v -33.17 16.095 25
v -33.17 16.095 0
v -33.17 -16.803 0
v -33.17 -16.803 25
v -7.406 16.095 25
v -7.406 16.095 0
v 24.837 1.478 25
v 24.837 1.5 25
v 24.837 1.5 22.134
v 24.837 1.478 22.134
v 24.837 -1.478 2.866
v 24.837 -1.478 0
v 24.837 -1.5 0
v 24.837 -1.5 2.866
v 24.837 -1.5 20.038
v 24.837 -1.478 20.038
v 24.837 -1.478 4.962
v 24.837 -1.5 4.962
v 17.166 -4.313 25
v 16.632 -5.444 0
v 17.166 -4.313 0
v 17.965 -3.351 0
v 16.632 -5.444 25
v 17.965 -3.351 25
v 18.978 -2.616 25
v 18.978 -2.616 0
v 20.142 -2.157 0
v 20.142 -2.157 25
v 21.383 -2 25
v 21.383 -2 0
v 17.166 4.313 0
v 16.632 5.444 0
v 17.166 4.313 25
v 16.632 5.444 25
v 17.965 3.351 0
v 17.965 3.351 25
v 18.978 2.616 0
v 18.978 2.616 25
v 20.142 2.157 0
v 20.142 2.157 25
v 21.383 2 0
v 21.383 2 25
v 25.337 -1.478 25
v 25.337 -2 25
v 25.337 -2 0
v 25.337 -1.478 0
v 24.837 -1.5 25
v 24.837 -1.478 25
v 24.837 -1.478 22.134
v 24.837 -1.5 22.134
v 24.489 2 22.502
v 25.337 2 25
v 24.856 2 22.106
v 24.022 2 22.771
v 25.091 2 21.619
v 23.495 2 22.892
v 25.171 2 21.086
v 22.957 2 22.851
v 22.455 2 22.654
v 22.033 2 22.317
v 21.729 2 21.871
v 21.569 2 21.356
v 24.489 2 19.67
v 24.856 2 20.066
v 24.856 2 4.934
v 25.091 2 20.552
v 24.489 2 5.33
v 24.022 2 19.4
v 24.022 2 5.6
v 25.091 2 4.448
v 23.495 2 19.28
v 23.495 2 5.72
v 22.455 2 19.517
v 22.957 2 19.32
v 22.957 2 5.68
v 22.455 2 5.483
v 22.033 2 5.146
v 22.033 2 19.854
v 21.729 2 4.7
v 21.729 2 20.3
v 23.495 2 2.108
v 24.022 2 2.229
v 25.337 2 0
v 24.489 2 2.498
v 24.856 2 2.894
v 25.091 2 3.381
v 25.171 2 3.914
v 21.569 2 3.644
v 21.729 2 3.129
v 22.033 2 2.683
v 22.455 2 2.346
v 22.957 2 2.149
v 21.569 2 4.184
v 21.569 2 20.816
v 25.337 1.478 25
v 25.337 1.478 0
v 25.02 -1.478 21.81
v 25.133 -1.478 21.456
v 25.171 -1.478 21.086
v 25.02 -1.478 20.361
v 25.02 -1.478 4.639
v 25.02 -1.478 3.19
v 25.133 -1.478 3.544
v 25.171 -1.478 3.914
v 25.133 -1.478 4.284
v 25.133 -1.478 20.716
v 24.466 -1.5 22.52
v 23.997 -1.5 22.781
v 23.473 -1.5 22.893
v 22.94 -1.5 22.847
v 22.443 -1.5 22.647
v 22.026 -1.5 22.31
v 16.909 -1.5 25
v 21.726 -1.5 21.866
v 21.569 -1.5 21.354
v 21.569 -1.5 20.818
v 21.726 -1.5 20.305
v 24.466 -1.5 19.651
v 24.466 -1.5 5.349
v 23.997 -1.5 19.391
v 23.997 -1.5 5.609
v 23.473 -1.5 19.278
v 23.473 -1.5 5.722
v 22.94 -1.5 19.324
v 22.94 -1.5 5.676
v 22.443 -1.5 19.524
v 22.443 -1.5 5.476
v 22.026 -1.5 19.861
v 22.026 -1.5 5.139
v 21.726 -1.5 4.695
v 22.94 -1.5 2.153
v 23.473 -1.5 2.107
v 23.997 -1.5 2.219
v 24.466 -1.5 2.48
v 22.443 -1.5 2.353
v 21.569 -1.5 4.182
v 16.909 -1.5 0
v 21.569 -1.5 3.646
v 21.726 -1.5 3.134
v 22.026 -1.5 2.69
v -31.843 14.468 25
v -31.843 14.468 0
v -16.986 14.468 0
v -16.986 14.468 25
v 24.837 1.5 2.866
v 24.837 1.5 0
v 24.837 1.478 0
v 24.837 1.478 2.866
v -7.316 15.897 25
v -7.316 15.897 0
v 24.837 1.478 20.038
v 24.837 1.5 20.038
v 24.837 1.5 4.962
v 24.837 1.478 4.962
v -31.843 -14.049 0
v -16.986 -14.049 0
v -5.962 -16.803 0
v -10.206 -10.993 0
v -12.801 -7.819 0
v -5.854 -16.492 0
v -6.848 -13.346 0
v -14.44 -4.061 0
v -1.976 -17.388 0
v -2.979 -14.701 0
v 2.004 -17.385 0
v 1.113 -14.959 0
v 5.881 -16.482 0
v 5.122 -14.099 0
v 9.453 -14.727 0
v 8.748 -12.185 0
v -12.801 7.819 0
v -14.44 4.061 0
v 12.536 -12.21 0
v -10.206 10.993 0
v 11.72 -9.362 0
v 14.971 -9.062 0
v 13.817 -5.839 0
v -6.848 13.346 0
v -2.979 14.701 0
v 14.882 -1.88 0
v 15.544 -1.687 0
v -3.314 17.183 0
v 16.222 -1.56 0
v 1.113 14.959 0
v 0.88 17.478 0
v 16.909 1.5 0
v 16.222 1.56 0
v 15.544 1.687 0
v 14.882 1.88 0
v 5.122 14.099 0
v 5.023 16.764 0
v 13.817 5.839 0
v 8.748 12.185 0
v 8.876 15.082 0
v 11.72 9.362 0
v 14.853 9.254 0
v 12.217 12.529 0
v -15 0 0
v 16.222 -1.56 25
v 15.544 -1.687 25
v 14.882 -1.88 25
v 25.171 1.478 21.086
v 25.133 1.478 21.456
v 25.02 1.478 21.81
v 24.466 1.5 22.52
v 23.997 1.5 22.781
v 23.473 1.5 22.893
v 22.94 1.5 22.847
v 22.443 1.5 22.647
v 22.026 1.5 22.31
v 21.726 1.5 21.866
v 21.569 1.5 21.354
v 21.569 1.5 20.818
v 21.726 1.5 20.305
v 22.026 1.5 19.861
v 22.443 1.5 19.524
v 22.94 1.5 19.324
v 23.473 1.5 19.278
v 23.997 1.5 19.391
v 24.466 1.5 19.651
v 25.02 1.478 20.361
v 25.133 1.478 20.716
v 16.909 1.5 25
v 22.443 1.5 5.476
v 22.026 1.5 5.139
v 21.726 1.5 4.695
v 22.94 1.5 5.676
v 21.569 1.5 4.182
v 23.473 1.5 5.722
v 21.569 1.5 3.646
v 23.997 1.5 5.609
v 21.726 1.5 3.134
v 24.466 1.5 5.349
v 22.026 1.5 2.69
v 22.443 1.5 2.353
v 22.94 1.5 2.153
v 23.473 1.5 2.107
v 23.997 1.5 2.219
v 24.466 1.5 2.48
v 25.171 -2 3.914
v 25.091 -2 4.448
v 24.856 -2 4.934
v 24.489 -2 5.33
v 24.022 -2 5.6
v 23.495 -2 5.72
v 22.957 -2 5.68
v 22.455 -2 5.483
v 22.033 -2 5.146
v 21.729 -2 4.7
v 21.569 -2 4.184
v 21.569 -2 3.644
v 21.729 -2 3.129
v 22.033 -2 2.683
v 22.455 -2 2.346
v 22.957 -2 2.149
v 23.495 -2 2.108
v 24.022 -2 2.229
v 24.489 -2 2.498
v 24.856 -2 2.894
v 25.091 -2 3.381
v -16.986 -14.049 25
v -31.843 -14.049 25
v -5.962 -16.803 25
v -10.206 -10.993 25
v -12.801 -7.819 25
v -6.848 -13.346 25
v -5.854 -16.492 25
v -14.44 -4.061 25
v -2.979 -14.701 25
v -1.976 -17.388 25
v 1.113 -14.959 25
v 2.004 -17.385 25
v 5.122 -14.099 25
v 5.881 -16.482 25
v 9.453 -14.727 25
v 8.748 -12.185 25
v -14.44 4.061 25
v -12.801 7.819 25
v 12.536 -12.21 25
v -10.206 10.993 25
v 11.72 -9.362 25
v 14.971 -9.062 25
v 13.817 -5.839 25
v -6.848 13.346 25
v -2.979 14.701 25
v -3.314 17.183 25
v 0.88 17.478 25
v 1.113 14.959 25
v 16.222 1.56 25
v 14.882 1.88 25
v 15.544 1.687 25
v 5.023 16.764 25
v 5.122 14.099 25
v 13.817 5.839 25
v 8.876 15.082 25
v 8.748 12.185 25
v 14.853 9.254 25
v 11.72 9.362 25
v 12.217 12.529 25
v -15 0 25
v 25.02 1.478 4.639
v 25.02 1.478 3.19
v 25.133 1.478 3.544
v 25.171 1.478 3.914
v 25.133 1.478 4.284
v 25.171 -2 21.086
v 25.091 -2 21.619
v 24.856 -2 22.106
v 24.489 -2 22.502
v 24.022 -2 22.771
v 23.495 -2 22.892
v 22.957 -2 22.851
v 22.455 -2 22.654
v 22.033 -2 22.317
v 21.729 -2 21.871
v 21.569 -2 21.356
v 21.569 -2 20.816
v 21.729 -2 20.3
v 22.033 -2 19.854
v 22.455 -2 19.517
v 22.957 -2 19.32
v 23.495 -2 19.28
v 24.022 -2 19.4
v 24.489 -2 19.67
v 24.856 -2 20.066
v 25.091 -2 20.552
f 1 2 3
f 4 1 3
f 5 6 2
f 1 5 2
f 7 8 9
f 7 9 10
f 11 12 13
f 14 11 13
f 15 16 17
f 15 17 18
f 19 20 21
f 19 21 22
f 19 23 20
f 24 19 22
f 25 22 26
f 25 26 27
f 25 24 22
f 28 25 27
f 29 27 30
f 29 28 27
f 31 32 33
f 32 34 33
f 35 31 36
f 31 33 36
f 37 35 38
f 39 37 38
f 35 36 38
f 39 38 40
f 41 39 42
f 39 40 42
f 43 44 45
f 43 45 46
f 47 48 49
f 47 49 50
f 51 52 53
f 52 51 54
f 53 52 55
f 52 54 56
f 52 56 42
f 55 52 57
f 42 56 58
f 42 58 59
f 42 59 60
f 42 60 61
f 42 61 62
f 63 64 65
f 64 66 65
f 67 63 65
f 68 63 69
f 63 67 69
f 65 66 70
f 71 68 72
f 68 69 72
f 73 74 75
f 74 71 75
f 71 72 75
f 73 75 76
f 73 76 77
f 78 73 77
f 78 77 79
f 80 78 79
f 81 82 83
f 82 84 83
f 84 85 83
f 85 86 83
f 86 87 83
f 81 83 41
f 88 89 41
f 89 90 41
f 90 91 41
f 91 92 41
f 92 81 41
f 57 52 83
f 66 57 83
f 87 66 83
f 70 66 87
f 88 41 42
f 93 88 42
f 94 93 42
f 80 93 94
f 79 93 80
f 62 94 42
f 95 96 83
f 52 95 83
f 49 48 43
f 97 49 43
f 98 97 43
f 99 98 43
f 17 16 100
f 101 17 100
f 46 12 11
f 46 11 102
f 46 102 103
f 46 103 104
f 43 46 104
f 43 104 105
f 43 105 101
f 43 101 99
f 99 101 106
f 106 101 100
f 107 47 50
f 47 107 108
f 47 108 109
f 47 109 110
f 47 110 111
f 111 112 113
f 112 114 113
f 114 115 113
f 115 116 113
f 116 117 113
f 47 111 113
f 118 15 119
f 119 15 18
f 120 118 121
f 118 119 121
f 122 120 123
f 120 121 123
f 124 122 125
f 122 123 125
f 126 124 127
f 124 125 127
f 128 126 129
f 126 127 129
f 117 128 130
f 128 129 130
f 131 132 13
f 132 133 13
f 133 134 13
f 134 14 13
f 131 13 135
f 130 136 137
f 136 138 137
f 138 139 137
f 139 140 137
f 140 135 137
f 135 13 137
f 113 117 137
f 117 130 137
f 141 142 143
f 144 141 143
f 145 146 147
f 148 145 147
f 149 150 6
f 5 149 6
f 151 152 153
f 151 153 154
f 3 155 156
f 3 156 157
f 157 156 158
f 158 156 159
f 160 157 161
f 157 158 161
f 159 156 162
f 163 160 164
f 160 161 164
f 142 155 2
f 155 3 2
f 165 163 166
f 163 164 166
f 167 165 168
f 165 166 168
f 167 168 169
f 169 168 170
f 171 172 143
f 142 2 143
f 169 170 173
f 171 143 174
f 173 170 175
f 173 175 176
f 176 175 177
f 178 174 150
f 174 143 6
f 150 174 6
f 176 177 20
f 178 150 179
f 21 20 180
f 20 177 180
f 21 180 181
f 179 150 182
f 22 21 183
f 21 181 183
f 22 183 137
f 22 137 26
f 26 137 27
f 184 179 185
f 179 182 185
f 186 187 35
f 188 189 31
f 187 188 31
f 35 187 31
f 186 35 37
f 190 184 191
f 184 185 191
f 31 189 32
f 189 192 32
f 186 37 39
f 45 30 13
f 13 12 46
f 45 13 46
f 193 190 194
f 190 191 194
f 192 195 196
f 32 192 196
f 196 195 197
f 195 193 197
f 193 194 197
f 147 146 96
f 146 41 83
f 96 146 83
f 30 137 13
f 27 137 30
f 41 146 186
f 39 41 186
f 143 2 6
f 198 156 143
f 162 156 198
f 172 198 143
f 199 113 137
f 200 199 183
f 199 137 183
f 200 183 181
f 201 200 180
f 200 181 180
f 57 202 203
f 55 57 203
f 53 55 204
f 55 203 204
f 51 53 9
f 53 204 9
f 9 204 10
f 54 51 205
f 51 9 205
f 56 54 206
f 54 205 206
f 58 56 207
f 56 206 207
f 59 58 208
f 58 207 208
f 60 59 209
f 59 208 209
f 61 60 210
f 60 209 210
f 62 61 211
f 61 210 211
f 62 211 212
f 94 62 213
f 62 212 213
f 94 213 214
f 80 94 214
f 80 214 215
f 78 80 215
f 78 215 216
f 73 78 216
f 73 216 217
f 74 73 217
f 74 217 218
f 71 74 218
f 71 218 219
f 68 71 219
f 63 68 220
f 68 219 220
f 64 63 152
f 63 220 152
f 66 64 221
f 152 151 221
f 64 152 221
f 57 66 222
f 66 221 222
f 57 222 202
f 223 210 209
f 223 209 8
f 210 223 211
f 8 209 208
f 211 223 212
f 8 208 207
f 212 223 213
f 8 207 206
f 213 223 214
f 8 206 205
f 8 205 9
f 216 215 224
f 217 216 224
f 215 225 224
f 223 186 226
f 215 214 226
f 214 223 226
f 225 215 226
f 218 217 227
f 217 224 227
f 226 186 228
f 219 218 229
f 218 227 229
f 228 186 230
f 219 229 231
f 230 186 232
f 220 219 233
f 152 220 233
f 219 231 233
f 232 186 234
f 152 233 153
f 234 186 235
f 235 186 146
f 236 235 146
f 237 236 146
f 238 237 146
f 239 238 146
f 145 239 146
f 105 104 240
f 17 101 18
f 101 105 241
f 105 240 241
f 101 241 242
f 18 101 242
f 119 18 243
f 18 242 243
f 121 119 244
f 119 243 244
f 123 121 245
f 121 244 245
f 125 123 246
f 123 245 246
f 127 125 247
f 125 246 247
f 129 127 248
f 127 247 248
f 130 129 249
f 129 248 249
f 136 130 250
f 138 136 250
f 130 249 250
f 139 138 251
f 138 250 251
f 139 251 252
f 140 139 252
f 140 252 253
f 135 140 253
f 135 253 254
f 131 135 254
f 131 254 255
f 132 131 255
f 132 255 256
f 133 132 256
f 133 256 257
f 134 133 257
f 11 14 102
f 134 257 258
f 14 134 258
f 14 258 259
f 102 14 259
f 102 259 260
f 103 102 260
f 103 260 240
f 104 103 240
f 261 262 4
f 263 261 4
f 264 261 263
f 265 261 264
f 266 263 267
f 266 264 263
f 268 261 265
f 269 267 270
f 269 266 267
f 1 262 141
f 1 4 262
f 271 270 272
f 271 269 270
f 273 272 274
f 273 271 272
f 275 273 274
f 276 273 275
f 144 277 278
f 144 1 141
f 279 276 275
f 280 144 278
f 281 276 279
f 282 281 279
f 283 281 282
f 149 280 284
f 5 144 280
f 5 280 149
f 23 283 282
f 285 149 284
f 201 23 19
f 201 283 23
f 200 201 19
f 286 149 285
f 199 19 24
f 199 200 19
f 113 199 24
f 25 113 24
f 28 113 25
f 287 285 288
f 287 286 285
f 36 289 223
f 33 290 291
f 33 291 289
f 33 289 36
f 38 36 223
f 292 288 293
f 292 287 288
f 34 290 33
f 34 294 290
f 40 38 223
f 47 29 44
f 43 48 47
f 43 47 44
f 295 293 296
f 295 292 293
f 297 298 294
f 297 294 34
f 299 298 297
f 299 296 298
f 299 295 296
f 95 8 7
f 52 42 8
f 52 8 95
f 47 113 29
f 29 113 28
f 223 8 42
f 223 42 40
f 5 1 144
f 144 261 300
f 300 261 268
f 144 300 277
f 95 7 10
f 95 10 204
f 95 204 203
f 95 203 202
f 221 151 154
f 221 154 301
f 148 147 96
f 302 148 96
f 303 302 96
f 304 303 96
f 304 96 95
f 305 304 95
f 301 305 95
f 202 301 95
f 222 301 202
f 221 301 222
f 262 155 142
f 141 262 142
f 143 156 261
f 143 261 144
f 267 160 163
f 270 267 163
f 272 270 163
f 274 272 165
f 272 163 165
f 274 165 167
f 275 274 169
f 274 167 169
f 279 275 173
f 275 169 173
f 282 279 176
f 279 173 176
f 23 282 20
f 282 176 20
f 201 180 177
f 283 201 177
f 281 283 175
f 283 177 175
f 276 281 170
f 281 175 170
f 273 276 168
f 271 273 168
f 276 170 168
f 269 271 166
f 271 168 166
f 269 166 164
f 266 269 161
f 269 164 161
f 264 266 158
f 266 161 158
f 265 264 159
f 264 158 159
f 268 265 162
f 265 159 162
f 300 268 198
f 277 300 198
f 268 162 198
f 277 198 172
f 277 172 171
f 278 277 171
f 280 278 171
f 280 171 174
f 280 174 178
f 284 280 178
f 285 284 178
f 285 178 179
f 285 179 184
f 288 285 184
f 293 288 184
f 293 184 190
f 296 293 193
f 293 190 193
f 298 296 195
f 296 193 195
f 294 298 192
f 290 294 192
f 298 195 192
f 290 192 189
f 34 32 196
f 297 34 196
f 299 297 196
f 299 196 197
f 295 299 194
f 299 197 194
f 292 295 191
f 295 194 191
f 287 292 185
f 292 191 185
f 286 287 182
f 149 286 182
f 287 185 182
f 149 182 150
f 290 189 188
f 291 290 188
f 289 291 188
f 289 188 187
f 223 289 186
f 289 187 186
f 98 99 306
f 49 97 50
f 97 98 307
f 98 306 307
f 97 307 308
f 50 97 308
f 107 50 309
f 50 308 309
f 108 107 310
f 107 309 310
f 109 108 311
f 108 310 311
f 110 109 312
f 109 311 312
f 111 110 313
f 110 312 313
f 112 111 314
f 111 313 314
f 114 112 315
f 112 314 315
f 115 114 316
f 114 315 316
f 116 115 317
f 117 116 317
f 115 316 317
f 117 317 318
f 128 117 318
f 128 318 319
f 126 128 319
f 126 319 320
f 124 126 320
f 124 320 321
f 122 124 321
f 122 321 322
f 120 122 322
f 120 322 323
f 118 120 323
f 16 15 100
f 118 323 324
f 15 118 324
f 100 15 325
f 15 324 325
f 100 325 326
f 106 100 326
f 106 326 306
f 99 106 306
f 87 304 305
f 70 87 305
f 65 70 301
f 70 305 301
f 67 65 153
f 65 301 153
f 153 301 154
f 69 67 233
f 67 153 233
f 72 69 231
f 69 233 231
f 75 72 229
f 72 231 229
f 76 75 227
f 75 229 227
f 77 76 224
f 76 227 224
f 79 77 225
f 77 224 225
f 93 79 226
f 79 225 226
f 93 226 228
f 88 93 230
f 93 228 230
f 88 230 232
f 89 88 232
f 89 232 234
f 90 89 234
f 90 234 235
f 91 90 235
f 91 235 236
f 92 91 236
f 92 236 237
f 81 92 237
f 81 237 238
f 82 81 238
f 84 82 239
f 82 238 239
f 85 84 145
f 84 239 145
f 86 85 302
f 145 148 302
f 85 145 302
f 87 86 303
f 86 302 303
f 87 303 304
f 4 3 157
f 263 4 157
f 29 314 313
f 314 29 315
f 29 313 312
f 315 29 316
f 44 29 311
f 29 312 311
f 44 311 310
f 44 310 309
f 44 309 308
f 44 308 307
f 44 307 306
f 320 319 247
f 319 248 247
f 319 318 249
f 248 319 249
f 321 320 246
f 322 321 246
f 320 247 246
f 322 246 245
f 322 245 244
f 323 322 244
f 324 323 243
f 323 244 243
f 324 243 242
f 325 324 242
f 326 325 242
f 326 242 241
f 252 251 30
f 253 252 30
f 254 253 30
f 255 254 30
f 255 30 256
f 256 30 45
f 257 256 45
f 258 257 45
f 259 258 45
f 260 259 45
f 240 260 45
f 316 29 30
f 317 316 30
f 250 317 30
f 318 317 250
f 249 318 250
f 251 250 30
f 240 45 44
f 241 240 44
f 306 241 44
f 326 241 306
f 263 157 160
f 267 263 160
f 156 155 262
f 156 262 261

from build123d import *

# Parameters (mm, degrees)
F1_DEPTH       = 80
F2_R           = 9.4880271992
F3_DEPTH       = 600
F4_W           = 4.0547028184
F4_H           = 2.2076517344
F5_DEPTH       = 15
F6_R           = 8
F7_DEPTH       = 600
F9_START       = 50
F8_R           = 7.625
F9_DEPTH       = 570
F10_W          = 0.488139689
F10_H          = 8.393028751
F11_DEPTH      = 15
F13_DEPTH      = 25
F15_DEPTH      = 50
F17_DEPTH      = 295
F18_W          = 80
F18_H          = 61.0322915018
F19_DEPTH      = 10
F20_W          = 42.3060953617
F20_H          = 7.0626735687
F21_DEPTH      = 25
F22_W          = 33.6821526289
F22_H          = 16.1662399769
F23_DEPTH      = 25
F27_DEPTH      = 25
F28_R          = 5
F29_W          = 9.2532746494
F29_H          = 2.9556490481
F30_DEPTH      = 25
F30_DEPTH_BACK = 25
F31_R          = 1.8108941825
F32_DEPTH      = 25
F34_DEPTH      = 25
F35_W          = 14.8578360677
F35_H          = 28.517103754
F36_DEPTH      = 40


with BuildPart() as f1:
    # F0 (on Front) → F1 (new body)
    with BuildSketch(Plane.XZ):
        Polygon((0, 32.5182676315), (0, 0), (0, -28.3304974437), (43.5863435268, -28.3304974437), (43.5863435268, -20.3491598368), (7.9939365387, -20.3491598368), (7.9939365387, 0), (7.9939365387, 26.3243410736), (43.5863435268, 26.3243410736), (43.5863435268, 32.5182676315), align=None)
    extrude(amount=F1_DEPTH)

    # F2 (on face) → F3 (join)
    with BuildSketch(Plane.XY.offset(32.5182676315)):
        with Locations((32.2491303086, -37.8283821046)):
            Circle(F2_R)
    extrude(amount=F3_DEPTH)

    # F4 (on face) → F5 (cut)
    with BuildSketch(Plane.XY.offset(632.5182676315)):
        with Locations((22.9293145239, -37.5130698085)):
            Rectangle(F4_W, F4_H)
    extrude(amount=-F5_DEPTH, mode=Mode.SUBTRACT)

    # F6 (on face) → F7 (cut)
    with BuildSketch(Plane.XY.offset(632.5182676315)):
        with Locations((32.2491303086, -37.8283821046)):
            Circle(F6_R)
    extrude(amount=-F7_DEPTH, mode=Mode.SUBTRACT)


with BuildPart() as f9:
    # F8 (on face) → F9 (new body)
    with BuildSketch(Plane.XY.offset(32.5182676315).offset(F9_START)):
        with Locations((32.2491303086, -37.8283821046)):
            Circle(F8_R)
    extrude(amount=F9_DEPTH)

    # F10 (on face) → F11 (join)
    with BuildSketch(Plane.XY.offset(652.5182676315)):
        with Locations((31.1938934028, -27.710868977)):
            Rectangle(F10_W, F10_H)
    extrude(amount=-F11_DEPTH)

    # F12 (on face) → F13 (join)
    with BuildSketch(Plane.XY.offset(652.5182676315)):
        with BuildLine():
            ThreePointArc((24.8521837926, -35.977488472), (31.3166851855, -45.3961539757), (39.8741303086, -37.8283821046))
            ThreePointArc((39.8741303086, -37.8283821046), (39.8169021797, -36.8959369815), (39.6460768246, -35.977488472))
            Line((39.6460768246, -35.977488472), (24.8521837926, -35.977488472))
        make_face()
        with BuildLine():
            Line((24.8521837926, -35.977488472), (39.6460768246, -35.977488472))
            ThreePointArc((39.6460768246, -35.977488472), (32.2491303086, -30.2033821046), (24.8521837926, -35.977488472))
        make_face()
        with BuildLine():
            ThreePointArc((24.8521837926, -35.977488472), (32.2491303086, -30.2033821046), (39.6460768246, -35.977488472))
            Line((39.6460768246, -35.977488472), (39.6460768246, 264.022511528))
            Line((39.6460768246, 264.022511528), (24.8521837926, 264.022511528))
            Line((24.8521837926, 264.022511528), (24.8521837926, -35.977488472))
        make_face()
    extrude(amount=F13_DEPTH)

    # F14 (on face) → F15 (join)
    with BuildSketch(Plane.XY.offset(677.5182676315)):
        Polygon((154.8521837926, 264.022511528), (24.8521837926, 264.022511528), (-72.6417899132, 264.022511528), (-72.6417899132, -20.977488472), (154.8521837926, -20.977488472), align=None)
    extrude(amount=F15_DEPTH)

    # F16 (on face) → F17 (cut)
    with BuildSketch(Plane.XZ.offset(20.977488472)):
        Polygon((-52.7396649122, 686.2814426422), (154.8521837926, 727.5182676315), (-81.2070667744, 736.6052269936), (-72.6417899132, 692.2085285187), align=None)
    extrude(amount=-F17_DEPTH, mode=Mode.SUBTRACT)

    # F20 (on face) → F21 (join)
    with BuildSketch(Plane(origin=(0, 264.022511528, 0), x_dir=(-1, 0, 0), z_dir=(0, 1, 0))):
        with Locations((-93.7416106462, 696.6552138329)):
            Rectangle(F20_W, F20_H)
    extrude(amount=F21_DEPTH)

    # F22 (on face) → F23 (cut)
    with BuildSketch(Plane.XY.offset(700.1865506172)):
        with Locations((94.2212790251, 276.3699144125)):
            Rectangle(F22_W, F22_H)
    extrude(amount=-F23_DEPTH, mode=Mode.SUBTRACT)


with BuildPart() as f19:
    # F18 (on face) → F19 (new body)
    with BuildSketch(Plane.YZ.offset(43.5863435268)):
        with Locations((-40, 2.0021218807)):
            Rectangle(F18_W, F18_H)
    extrude(amount=F19_DEPTH)


with BuildPart() as f27:
    # F26 (on Top) → F27 (new body)
    with BuildSketch(Plane.XY):
        with BuildLine():
            Line((24.8369053006, 2), (17.3853386507, 2))
            ThreePointArc((17.3853386507, 2), (-17.5, 0), (17.3853386507, -2))
            Line((17.3853386507, -2), (24.8369053006, -2))
            Line((24.8369053006, -2), (25.3369053006, -2))
            Line((25.3369053006, -2), (25.3369053006, -1.5))
            Line((25.3369053006, -1.5), (25.3369053006, 1.5))
            Line((25.3369053006, 1.5), (25.3369053006, 2))
            Line((25.3369053006, 2), (24.8369053006, 2))
        make_face()
        with BuildLine():
            ThreePointArc((14.8817712447, -1.8795969301), (-15, 0), (14.8817712447, 1.8795969301))
            ThreePointArc((14.8817712447, 1.8795969301), (15.881113349, 1.6148969042), (16.9085127097, 1.5))
            Line((16.9085127097, 1.5), (17.4355957742, 1.5))
            Line((17.4355957742, 1.5), (24.8369053006, 1.5))
            Line((24.8369053006, 1.5), (24.8369053006, -1.5))
            Line((24.8369053006, -1.5), (17.4355957742, -1.5))
            Line((17.4355957742, -1.5), (16.9085127097, -1.5))
            ThreePointArc((16.9085127097, -1.5), (15.881113349, -1.6148969042), (14.8817712447, -1.8795969301))
        make_face(mode=Mode.SUBTRACT)
    extrude(amount=F27_DEPTH)

    # F28
    f28_edges = [f27.edges().sort_by_distance(p)[0] for p in [
        (17.385339, -2, 12.5),
        (17.385339, 2, 12.5),
    ]]
    fillet(f28_edges, radius=F28_R)

    # F29 (on Top) → F30 (cut, two sides)
    with BuildSketch(Plane.XY) as f30_sk:
        with Locations((24.9223280698, 0)):
            Rectangle(F29_W, F29_H)
    extrude(amount=-F30_DEPTH, mode=Mode.SUBTRACT)
    extrude(f30_sk.sketch, amount=F30_DEPTH_BACK, mode=Mode.SUBTRACT)

    # F31 (on face) → F32 (cut)
    with BuildSketch(Plane.XZ.offset(2)):
        with Locations((23.3601550405, 21.0856944323)):
            Circle(F31_R)
        with Locations((23.3601550405, 3.9143055677)):
            Circle(F31_R)
    extrude(amount=-F32_DEPTH, mode=Mode.SUBTRACT)

    # F33 (on Top) → F34 (join)
    with BuildSketch(Plane.XY):
        with BuildLine():
            Line((-33.1695042551, -16.8028511107), (-5.9619173408, -16.8028511107))
            ThreePointArc((-5.9619173408, -16.8028511107), (-6.6048434296, -16.5651949873), (-7.2380969958, -16.3028511107))
            Line((-7.2380969958, -16.3028511107), (-32.6695042551, -16.3028511107))
            Line((-32.6695042551, -16.3028511107), (-32.6695042551, 15.59525626))
            Line((-32.6695042551, 15.59525626), (-7.4055092994, 15.59525626))
            Line((-7.4055092994, 15.59525626), (-7.4055092994, 14.9921714968))
            ThreePointArc((-7.4055092994, 14.9921714968), (-7.2011649888, 15.0890530596), (-6.9955289917, 15.1831618859))
            Line((-6.9955289917, 15.1831618859), (-7.4055092994, 16.09525626))
            Line((-7.4055092994, 16.09525626), (-33.1695042551, 16.09525626))
            Line((-33.1695042551, 16.09525626), (-33.1695042551, 15.59525626))
            Line((-33.1695042551, 15.59525626), (-33.1695042551, -16.8028511107))
        make_face()
        with BuildLine():
            ThreePointArc((-7.2380969958, -16.3028511107), (-6.6048434296, -16.5651949873), (-5.9619173408, -16.8028511107))
            Line((-5.9619173408, -16.8028511107), (-5.633405689, -15.8583511929))
            ThreePointArc((-5.633405689, -15.8583511929), (-16.8329065642, -1.0255109398), (-7.4055092994, 14.9921714968))
            Line((-7.4055092994, 14.9921714968), (-7.4055092994, 15.59525626))
            Line((-7.4055092994, 15.59525626), (-32.6695042551, 15.59525626))
            Line((-32.6695042551, 15.59525626), (-32.6695042551, -16.3028511107))
            Line((-32.6695042551, -16.3028511107), (-7.2380969958, -16.3028511107))
        make_face()
    extrude(amount=F34_DEPTH)

    # F35 (on Top) → F36 (cut)
    with BuildSketch(Plane.XY):
        with Locations((-24.4145058095, 0.2095359378)):
            Rectangle(F35_W, F35_H)
    extrude(amount=F36_DEPTH, mode=Mode.SUBTRACT)


solid = f27.part
